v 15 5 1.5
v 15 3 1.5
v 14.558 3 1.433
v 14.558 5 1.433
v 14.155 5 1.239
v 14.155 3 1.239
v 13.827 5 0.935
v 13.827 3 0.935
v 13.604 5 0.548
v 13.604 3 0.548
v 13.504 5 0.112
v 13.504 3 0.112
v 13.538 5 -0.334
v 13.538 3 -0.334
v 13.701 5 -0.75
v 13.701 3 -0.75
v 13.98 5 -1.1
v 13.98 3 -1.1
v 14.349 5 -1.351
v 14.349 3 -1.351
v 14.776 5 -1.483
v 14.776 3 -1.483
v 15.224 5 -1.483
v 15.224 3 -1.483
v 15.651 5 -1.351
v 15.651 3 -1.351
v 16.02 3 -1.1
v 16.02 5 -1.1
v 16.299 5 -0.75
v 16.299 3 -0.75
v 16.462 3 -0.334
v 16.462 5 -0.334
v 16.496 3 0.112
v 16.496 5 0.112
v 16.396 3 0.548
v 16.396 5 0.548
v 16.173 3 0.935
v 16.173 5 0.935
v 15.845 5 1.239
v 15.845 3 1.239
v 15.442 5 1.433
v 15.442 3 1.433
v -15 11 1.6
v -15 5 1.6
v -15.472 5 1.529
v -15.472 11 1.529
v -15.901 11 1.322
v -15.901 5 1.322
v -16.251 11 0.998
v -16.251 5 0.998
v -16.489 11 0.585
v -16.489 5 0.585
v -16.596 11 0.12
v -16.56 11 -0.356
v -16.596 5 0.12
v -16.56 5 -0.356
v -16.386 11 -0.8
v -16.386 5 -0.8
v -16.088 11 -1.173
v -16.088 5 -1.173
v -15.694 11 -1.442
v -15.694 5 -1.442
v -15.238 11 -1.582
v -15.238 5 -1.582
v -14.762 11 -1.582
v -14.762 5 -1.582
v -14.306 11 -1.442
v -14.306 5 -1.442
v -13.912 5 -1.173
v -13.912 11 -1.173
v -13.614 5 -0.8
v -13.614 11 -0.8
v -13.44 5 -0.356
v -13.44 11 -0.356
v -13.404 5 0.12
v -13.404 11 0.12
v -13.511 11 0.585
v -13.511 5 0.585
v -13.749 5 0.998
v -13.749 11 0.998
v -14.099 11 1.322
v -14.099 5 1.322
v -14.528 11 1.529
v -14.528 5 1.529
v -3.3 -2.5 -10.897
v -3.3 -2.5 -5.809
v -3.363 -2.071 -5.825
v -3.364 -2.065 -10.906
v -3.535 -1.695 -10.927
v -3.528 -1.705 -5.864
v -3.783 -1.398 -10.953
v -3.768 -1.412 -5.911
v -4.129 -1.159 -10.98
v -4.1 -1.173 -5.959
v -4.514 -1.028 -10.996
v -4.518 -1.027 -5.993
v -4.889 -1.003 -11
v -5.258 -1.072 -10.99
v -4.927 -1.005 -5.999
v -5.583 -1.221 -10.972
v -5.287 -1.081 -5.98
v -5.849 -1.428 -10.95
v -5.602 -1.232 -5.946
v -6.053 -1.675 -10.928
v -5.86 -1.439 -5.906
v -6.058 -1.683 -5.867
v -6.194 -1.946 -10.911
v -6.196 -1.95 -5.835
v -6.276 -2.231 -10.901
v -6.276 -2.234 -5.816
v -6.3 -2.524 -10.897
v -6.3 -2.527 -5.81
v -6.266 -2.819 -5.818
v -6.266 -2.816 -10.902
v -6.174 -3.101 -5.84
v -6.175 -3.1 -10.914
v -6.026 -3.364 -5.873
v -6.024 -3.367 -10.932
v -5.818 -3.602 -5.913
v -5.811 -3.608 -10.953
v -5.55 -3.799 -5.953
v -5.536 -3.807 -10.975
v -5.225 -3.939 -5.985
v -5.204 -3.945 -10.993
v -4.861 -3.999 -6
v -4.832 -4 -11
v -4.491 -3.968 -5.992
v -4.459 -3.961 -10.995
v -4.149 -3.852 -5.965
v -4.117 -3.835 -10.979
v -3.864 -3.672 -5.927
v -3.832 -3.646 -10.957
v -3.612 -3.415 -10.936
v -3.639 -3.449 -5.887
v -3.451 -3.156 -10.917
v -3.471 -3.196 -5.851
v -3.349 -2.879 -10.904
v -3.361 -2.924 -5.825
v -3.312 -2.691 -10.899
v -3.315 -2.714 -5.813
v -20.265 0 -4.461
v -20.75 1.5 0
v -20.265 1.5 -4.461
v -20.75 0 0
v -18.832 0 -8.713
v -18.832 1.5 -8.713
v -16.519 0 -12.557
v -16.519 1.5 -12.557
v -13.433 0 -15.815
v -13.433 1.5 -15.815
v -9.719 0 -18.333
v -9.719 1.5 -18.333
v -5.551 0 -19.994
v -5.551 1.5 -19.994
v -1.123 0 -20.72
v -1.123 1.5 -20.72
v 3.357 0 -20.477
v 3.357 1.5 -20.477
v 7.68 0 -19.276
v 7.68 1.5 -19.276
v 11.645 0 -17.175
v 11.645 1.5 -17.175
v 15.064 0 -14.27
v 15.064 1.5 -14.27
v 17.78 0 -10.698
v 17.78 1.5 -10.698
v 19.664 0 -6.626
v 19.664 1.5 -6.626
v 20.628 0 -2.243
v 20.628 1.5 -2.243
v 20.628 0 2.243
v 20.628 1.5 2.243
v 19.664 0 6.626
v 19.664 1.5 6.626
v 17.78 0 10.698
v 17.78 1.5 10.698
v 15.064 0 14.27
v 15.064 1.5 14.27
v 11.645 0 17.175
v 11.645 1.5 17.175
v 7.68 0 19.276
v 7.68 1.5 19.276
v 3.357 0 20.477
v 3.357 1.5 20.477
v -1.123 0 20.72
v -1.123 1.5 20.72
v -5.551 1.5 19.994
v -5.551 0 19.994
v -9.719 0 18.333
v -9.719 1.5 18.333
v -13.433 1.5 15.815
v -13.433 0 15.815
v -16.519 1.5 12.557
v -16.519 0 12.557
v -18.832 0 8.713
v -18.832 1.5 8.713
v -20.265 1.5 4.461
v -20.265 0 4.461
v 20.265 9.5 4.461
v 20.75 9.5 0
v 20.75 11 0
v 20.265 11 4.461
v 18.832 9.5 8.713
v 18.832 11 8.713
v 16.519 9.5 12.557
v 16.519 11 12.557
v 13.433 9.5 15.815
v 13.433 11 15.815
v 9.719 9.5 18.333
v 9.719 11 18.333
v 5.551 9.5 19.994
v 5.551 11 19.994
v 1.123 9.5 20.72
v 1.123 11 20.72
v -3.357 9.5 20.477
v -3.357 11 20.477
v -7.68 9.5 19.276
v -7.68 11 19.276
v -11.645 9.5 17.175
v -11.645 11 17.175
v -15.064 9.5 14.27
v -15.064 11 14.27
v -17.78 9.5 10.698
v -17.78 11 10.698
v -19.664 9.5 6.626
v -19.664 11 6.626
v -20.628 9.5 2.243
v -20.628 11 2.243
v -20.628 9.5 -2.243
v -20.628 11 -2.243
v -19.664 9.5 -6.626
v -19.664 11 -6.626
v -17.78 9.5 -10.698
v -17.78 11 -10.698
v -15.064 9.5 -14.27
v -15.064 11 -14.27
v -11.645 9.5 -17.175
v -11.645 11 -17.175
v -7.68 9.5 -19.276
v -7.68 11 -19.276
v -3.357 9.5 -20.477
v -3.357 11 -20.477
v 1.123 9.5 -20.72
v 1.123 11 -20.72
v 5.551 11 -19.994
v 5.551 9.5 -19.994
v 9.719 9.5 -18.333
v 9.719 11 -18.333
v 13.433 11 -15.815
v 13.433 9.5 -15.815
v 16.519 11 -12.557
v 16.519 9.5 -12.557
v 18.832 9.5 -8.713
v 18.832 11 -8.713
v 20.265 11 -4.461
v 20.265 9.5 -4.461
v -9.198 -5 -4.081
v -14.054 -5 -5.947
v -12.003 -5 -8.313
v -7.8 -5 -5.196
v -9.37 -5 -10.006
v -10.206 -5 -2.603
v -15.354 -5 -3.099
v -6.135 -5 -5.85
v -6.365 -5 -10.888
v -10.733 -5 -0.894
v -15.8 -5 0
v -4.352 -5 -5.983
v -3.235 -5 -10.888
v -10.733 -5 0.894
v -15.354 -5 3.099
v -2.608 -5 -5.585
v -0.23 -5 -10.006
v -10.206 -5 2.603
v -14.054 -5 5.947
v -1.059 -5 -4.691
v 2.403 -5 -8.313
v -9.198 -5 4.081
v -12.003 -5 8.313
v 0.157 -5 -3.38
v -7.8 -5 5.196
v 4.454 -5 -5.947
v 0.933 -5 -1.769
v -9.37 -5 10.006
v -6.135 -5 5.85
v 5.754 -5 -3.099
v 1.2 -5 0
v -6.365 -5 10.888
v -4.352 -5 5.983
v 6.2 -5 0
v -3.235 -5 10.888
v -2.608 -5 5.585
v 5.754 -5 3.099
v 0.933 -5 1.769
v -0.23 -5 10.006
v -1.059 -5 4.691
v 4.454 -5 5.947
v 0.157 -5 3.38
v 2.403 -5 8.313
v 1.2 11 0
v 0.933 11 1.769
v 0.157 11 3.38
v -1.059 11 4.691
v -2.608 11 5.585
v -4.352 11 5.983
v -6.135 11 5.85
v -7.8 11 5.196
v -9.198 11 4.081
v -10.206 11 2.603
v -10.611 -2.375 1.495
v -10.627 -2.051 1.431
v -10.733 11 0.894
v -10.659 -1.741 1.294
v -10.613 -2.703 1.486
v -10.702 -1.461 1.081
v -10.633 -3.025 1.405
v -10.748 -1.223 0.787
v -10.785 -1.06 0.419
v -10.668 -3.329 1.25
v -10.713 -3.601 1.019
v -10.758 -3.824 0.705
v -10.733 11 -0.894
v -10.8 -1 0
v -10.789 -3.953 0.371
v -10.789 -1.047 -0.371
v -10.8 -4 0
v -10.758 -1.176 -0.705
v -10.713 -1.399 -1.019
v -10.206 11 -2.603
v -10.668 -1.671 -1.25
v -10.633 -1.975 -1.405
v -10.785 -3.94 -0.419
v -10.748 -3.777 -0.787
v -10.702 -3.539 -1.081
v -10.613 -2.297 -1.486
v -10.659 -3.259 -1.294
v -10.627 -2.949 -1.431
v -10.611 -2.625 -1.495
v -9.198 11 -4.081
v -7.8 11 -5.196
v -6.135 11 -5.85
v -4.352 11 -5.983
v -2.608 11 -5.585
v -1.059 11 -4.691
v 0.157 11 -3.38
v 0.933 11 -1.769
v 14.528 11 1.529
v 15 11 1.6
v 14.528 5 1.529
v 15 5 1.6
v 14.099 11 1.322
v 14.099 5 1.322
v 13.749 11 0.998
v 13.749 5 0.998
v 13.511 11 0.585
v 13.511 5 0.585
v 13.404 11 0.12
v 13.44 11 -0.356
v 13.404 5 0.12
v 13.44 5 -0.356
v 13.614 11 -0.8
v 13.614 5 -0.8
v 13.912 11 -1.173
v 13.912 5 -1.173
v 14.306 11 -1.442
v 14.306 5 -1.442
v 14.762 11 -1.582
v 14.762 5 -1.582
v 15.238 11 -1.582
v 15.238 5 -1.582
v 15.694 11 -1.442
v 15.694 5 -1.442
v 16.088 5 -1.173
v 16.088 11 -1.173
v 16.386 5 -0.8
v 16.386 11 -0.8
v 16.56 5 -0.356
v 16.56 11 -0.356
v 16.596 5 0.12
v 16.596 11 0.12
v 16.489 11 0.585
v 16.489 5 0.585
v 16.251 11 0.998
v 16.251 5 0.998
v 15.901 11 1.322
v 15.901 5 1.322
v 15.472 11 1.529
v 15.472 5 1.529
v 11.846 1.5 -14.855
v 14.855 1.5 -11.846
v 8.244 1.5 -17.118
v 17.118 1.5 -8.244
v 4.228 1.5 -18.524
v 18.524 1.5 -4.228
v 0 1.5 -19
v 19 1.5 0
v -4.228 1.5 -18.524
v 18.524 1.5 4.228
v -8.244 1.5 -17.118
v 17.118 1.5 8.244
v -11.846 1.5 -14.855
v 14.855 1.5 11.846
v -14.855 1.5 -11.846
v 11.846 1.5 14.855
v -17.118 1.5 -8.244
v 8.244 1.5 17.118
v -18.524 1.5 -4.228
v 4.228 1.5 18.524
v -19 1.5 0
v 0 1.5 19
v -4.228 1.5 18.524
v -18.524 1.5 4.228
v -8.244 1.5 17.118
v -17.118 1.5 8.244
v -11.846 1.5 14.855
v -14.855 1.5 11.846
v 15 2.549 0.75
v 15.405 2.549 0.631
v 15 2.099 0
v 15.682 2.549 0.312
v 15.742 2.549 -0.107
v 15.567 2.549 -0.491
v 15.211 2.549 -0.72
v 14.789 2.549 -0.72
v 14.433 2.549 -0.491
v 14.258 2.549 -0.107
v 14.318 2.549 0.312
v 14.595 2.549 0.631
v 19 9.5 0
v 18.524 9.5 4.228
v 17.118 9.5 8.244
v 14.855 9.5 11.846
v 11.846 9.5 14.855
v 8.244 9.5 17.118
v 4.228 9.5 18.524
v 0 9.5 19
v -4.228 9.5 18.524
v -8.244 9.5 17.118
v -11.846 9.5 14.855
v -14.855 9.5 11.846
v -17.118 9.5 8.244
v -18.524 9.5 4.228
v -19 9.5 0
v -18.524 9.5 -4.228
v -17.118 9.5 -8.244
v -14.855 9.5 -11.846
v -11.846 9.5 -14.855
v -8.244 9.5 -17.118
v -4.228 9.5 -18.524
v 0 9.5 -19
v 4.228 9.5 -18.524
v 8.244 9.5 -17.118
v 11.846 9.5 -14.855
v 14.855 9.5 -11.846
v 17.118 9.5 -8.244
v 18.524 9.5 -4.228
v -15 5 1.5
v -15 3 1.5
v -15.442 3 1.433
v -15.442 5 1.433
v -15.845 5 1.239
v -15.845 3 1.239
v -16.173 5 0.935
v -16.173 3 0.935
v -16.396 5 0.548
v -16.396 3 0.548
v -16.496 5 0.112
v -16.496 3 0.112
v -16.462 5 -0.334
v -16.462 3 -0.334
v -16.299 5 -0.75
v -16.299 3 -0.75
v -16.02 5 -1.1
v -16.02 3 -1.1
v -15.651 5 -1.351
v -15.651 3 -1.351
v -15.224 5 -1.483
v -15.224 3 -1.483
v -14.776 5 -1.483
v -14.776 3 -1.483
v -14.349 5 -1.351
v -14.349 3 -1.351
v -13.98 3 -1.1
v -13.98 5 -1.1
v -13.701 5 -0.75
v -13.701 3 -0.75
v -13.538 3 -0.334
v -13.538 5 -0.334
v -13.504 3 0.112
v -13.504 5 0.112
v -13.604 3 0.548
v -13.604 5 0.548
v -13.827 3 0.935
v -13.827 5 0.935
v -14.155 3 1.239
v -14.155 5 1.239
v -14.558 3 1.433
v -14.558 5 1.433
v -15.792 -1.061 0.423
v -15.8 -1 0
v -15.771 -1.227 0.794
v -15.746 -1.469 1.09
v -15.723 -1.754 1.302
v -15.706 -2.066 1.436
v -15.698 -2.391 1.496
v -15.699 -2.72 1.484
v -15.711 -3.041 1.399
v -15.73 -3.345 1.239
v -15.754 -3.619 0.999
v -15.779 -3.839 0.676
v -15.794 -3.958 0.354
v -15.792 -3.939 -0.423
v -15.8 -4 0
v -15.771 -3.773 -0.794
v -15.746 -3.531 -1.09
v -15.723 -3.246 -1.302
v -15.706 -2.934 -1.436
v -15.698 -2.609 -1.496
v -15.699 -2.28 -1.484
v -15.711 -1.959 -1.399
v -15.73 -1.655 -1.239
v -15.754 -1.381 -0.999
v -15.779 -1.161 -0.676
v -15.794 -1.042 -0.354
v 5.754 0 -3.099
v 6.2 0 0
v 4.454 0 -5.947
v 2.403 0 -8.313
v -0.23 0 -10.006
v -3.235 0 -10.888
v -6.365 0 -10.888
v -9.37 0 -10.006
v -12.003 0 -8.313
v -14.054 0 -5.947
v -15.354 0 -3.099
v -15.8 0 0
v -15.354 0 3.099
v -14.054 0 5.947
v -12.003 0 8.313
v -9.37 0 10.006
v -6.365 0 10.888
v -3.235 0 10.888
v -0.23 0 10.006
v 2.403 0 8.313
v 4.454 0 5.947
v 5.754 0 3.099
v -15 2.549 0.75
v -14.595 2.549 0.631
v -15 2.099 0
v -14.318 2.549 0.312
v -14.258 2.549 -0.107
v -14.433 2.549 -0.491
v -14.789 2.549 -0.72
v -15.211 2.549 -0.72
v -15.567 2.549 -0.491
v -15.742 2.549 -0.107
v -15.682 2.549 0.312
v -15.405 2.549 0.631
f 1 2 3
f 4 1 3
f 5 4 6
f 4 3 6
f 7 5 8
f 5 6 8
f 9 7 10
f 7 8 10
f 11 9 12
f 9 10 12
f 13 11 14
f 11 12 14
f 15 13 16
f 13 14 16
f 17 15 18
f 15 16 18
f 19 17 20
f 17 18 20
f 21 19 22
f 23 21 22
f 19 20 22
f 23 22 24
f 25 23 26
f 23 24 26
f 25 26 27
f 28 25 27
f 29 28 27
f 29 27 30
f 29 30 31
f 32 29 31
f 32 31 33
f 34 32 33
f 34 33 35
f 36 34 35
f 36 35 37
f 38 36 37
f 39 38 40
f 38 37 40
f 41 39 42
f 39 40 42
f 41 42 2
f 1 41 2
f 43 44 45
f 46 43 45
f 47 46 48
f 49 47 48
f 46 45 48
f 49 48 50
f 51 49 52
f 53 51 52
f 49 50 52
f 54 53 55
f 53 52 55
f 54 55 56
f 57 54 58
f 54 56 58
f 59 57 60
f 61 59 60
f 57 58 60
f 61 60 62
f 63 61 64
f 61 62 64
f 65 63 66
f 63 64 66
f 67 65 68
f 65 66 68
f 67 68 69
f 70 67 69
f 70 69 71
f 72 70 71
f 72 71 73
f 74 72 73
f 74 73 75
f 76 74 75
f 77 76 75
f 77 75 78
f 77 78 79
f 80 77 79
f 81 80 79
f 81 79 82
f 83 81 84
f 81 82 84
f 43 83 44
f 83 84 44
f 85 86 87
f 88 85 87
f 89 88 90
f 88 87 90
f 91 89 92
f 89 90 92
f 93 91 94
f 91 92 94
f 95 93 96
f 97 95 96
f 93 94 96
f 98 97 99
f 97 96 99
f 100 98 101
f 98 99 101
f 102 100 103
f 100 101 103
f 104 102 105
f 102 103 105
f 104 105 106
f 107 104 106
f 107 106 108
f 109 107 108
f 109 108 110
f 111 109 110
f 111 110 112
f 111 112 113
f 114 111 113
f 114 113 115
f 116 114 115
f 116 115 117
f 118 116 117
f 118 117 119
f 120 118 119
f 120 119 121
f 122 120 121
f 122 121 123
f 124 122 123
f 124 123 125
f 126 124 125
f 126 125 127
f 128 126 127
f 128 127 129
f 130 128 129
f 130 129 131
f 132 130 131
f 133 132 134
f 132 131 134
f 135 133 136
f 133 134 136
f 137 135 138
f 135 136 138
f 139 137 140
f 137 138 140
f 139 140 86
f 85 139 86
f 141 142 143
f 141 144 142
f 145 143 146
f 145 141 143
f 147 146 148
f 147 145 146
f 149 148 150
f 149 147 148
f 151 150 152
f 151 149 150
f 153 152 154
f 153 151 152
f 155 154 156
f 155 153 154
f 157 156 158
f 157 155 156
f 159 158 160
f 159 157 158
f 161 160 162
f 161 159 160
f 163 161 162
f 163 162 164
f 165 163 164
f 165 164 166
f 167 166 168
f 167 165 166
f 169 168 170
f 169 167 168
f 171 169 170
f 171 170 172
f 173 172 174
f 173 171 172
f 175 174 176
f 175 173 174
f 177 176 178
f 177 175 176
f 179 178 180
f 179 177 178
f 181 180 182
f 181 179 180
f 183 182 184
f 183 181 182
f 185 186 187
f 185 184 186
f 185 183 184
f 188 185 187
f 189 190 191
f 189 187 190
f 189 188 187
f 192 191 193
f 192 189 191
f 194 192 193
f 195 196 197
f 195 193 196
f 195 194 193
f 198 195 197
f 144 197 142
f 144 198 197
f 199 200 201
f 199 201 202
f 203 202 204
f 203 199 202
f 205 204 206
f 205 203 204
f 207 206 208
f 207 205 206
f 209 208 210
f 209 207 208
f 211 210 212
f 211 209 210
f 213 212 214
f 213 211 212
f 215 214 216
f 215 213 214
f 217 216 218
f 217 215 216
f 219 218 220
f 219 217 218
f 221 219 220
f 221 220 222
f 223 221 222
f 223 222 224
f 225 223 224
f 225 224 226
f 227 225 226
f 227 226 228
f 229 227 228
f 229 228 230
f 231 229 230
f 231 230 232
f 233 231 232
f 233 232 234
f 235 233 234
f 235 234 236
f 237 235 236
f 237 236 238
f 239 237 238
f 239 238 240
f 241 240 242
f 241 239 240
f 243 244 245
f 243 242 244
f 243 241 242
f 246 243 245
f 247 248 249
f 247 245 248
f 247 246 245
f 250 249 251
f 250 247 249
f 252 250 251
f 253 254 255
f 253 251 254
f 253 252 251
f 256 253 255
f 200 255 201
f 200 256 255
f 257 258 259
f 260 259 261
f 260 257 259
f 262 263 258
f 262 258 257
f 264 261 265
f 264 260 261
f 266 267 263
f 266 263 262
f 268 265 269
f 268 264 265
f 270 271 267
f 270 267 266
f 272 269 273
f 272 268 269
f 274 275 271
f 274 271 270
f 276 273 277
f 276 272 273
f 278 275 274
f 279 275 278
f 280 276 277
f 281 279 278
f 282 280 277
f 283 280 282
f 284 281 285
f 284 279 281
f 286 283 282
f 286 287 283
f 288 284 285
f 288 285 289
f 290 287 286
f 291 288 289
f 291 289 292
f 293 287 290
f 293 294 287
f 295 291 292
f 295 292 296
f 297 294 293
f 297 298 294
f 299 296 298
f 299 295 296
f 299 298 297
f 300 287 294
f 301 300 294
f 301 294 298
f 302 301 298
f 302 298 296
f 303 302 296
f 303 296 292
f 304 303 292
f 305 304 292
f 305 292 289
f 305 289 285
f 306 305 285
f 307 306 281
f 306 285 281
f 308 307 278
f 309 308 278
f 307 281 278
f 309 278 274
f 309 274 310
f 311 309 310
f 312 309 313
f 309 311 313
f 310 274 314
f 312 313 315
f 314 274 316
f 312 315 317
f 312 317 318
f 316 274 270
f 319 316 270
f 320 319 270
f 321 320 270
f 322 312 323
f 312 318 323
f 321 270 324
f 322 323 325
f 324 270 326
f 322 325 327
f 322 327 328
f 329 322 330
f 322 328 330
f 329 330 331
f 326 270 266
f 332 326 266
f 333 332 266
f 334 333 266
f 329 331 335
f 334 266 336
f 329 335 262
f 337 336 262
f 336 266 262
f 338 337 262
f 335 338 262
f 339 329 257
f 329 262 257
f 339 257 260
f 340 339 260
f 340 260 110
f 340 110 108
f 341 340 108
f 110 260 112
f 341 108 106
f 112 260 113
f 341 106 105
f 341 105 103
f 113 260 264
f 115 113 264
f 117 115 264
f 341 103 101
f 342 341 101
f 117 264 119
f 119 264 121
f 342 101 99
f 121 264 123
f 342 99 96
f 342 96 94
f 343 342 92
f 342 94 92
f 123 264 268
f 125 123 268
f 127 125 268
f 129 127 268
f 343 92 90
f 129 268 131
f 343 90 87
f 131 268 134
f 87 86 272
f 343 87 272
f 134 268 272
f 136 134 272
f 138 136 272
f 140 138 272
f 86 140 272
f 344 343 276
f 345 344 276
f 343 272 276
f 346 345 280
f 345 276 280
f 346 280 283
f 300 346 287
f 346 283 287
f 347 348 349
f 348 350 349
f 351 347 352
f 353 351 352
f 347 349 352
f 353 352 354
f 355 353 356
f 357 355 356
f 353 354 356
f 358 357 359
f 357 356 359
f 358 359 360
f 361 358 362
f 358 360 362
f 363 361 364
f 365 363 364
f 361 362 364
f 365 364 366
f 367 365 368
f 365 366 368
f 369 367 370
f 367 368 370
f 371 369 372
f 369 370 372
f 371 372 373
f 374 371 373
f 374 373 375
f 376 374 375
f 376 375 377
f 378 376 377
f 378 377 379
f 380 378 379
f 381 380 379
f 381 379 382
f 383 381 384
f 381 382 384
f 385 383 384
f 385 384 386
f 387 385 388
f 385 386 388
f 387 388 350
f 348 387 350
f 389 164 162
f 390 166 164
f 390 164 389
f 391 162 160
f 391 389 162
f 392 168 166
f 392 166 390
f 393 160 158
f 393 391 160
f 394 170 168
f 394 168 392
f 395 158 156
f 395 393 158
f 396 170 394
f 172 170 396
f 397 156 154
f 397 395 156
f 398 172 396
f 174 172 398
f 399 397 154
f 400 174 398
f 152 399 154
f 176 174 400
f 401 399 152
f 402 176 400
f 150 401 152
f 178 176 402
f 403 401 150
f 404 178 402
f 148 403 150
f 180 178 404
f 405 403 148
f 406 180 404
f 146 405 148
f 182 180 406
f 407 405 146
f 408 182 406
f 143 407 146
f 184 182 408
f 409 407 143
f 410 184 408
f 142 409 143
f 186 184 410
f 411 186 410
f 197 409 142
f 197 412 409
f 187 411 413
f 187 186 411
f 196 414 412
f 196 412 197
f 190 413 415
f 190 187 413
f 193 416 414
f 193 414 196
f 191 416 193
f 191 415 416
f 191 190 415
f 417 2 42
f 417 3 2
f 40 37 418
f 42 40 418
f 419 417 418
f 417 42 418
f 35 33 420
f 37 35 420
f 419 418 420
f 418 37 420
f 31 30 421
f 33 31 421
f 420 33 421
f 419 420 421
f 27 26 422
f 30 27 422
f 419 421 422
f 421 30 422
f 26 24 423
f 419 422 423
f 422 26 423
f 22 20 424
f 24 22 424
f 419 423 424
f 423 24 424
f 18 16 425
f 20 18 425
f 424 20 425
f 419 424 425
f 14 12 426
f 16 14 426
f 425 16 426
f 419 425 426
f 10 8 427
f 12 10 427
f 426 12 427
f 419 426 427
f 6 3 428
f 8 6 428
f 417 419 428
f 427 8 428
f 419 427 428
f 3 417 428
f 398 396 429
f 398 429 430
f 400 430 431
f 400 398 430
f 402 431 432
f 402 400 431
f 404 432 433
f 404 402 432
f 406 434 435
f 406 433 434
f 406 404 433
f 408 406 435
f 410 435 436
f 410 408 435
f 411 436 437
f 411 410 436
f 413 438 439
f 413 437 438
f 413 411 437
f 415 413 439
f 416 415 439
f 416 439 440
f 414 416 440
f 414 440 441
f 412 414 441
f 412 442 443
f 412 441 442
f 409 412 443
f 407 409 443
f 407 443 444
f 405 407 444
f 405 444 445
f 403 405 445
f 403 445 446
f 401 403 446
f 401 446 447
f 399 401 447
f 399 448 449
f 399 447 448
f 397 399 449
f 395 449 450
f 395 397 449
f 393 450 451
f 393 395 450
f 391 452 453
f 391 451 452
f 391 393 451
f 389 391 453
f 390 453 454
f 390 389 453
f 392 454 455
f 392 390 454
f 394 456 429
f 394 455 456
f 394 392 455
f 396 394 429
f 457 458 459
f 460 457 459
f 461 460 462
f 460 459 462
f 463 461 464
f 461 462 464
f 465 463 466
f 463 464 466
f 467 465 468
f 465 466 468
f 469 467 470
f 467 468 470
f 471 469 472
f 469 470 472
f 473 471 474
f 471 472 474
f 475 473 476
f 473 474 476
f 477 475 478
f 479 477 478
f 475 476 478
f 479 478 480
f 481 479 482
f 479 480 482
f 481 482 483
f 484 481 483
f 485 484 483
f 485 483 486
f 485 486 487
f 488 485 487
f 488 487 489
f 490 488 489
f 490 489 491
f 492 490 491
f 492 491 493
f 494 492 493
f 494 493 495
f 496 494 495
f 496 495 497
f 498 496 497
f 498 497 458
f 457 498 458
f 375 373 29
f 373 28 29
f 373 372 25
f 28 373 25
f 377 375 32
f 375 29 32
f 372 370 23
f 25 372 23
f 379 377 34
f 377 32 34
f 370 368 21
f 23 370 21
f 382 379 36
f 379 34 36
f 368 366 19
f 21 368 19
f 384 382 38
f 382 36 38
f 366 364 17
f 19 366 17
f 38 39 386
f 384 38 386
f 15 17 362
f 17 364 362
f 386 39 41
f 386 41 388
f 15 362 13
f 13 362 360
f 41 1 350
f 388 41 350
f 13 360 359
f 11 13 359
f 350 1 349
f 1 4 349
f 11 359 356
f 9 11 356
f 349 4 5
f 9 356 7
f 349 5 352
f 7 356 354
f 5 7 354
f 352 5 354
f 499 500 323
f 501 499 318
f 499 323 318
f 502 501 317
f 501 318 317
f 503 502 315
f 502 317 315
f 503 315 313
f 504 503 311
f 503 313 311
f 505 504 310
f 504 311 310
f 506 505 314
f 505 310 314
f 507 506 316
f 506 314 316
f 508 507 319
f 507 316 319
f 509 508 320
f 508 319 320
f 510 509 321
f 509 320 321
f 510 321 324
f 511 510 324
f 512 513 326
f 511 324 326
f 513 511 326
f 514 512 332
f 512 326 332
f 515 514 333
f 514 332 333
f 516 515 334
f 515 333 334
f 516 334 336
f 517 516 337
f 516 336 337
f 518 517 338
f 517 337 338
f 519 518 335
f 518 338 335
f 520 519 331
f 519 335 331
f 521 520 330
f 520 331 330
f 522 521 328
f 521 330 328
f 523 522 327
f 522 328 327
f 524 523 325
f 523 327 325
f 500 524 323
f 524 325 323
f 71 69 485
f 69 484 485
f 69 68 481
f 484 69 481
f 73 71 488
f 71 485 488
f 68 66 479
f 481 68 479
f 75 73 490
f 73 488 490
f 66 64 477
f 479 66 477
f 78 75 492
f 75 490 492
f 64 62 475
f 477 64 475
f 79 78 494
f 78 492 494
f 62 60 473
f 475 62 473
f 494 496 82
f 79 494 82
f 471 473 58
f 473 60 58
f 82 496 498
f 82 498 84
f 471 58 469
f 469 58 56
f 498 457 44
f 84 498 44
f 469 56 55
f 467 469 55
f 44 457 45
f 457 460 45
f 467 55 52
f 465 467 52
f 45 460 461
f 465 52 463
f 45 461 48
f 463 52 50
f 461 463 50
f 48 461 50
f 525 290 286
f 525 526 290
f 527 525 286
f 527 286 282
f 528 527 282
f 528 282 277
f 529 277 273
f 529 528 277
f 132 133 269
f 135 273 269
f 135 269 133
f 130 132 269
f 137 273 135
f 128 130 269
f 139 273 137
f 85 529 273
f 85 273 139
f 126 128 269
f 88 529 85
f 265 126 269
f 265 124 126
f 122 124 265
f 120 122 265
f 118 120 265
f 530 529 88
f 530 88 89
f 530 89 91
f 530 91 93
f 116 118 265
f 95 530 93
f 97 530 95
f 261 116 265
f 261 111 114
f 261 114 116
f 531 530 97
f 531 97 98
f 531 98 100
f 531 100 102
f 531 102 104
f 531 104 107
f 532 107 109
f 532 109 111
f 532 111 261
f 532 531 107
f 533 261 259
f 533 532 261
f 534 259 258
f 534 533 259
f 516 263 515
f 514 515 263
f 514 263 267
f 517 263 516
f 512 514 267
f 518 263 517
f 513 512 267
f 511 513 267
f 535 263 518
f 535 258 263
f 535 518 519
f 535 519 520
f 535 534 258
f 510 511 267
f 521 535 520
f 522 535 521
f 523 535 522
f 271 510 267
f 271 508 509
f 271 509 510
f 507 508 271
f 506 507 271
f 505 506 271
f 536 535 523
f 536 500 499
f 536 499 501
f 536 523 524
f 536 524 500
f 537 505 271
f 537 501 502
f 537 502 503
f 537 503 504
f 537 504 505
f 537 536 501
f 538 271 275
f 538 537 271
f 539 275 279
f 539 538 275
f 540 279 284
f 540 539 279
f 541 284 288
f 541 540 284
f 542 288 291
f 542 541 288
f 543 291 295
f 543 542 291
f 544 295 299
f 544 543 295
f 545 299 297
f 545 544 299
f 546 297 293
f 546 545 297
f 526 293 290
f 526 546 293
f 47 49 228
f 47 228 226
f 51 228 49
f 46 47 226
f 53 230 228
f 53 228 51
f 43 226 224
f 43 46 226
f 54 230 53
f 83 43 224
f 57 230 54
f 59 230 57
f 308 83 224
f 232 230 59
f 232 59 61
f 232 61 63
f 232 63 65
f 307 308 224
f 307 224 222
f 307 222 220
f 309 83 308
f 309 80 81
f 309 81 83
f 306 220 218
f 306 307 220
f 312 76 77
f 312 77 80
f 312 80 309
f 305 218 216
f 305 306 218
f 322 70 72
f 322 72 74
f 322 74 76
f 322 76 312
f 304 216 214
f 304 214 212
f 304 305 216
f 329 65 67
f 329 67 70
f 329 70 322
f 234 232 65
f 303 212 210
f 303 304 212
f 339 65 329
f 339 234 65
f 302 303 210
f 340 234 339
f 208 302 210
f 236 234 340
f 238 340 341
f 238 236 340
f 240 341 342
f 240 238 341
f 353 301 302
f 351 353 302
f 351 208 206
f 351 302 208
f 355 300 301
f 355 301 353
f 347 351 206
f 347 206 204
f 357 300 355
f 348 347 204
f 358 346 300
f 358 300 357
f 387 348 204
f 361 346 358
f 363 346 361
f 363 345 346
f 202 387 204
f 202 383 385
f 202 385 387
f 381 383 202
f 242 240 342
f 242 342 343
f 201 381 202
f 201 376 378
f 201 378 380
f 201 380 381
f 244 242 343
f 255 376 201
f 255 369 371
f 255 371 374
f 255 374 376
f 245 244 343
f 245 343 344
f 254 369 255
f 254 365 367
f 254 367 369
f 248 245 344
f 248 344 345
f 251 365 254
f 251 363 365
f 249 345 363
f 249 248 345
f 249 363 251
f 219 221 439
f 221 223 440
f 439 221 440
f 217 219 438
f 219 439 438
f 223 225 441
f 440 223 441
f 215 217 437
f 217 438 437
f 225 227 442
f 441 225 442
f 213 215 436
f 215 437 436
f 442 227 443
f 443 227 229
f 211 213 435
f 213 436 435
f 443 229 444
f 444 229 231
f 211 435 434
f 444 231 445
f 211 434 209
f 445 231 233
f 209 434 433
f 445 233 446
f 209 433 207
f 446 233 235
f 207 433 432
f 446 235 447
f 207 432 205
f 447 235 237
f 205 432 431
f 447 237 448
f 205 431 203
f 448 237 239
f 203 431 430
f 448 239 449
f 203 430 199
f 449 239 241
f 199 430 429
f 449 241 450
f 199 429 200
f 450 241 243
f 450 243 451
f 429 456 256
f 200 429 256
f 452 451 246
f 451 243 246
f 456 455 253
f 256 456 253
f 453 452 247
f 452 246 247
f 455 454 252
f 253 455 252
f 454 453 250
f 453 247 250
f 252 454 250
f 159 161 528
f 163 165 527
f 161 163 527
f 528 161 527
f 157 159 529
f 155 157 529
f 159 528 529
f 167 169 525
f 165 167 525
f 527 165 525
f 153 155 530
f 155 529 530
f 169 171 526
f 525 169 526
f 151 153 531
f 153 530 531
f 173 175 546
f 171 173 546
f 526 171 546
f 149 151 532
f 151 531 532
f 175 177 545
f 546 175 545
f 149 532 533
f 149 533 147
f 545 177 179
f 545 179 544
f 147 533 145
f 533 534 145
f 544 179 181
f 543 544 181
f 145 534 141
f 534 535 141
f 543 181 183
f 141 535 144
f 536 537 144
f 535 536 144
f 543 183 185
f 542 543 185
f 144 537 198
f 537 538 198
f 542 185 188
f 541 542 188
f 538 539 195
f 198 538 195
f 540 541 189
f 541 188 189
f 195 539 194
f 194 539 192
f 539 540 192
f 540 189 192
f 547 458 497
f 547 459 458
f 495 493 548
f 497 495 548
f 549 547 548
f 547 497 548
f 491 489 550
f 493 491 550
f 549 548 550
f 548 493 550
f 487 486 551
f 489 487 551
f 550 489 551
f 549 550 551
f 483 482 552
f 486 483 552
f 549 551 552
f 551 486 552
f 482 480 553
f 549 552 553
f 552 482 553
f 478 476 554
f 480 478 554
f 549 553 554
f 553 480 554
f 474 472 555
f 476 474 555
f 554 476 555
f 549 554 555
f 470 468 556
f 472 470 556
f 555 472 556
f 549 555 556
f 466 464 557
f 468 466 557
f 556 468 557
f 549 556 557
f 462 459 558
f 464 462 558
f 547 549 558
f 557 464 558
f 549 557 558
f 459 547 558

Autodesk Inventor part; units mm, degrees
ref_plane "YZ Plane" through (0, 0, 0) normal (1, 0, 0) x (0, 1, 0)
ref_plane "XZ Plane" through (0, 0, 0) normal (0, 1, 0) x (-1, 0, 0)
ref_plane "XY Plane" through (0, 0, 0) normal (0, 0, 1) x (1, 0, 0)
sketch "Sketch1" plane through (0, 0, 0) normal (0, 1, 0) x (-1, 0, 0)
  circle A0 centre (0, 0) radius 20.75
  dimension "d0" = 41.5
extrude "Extrusion1" add sketch "Sketch1" along normal blind 1.5
sketch "Sketch2" plane through (0, 1.5, 0) normal (0, 1, 0) x (1, 0, 0)
  circle A0 centre (0, 0) radius 19
  dimension "d3" = 38
extrude "Extrusion2" add sketch "Sketch2" along normal blind 8
sketch "Sketch3" plane through (0, 9.5, 0) normal (0, 1, 0) x (1, 0, 0)
  circle A0 centre (0, 0) radius 20.75
extrude "Extrusion3" add sketch "Sketch3" along normal blind 1.5
sketch "Sketch4" plane through (0, 11, 0) normal (0, 1, 0) x (1, 0, 0)
  line L0 (0, 0) -> (-15, 0)
  circle A0 centre (-15, 0) radius 1.6
  line L1 (0, 0) -> (15, 0)
  circle A1 centre (15, 0) radius 1.6
  dimension "d8" = 15
  dimension "d9" = 3.2
  dimension "d10" = 15
hole "Hole1" at (-15, 11, 0) at (15, 11, 0) direction (0, -1, 0) diameter 3 depth 8 tip angle 118 counterbore diameter 3.2 counterbore depth 6
sketch "Sketch5" plane through (0, 0, 0) normal (0, -1, 0) x (1, 0, 0)
  line L0 (0, 0) -> (-4.8, 0)
  circle A0 centre (-4.8, 0) radius 11
  dimension "d18" = 4.8
  dimension "d19" = 22
extrude "Extrusion4" add sketch "Sketch5" along normal blind 5
sketch "Sketch6" plane through (-4.8, -5, 0) normal (0, -1, 0) x (1, 0, 0)
  circle A0 centre (0, 0) radius 6
  point P0 (4.8, 0)
  dimension "d22" = 12
extrude "Extrusion5" cut sketch "Sketch6" against normal through all
sketch "Sketch8" plane through (0, 0, 0) normal (1, 0, 0) x (0, 1, 0)
  line L0 (-5, -6) -> (-5, 6) projected
  line L1 (-5, 0) -> (-2.5, 0)
  circle A0 centre (-2.5, 0) radius 1.5
  point P0 (0, 0)
  dimension "d25" = 2.5
  dimension "d26" = 3
extrude "Extrusion6" cut sketch "Sketch8" against normal through all
sketch "Sketch9" plane through (0, 0, 0) normal (0, 0, 1) x (1, 0, 0)
  line L0 (6.2, 0) -> (6.2, -5) projected
  line L1 (6.2, -2.5) -> (-4.8, -2.5)
  circle A0 centre (-4.8, -2.5) radius 1.5
  point P0 (0, 0)
  dimension "d29" = 11
  dimension "d30" = 3
extrude "Extrusion7" cut sketch "Sketch9" against normal through all
properties part number "Assieme eccentrico"
